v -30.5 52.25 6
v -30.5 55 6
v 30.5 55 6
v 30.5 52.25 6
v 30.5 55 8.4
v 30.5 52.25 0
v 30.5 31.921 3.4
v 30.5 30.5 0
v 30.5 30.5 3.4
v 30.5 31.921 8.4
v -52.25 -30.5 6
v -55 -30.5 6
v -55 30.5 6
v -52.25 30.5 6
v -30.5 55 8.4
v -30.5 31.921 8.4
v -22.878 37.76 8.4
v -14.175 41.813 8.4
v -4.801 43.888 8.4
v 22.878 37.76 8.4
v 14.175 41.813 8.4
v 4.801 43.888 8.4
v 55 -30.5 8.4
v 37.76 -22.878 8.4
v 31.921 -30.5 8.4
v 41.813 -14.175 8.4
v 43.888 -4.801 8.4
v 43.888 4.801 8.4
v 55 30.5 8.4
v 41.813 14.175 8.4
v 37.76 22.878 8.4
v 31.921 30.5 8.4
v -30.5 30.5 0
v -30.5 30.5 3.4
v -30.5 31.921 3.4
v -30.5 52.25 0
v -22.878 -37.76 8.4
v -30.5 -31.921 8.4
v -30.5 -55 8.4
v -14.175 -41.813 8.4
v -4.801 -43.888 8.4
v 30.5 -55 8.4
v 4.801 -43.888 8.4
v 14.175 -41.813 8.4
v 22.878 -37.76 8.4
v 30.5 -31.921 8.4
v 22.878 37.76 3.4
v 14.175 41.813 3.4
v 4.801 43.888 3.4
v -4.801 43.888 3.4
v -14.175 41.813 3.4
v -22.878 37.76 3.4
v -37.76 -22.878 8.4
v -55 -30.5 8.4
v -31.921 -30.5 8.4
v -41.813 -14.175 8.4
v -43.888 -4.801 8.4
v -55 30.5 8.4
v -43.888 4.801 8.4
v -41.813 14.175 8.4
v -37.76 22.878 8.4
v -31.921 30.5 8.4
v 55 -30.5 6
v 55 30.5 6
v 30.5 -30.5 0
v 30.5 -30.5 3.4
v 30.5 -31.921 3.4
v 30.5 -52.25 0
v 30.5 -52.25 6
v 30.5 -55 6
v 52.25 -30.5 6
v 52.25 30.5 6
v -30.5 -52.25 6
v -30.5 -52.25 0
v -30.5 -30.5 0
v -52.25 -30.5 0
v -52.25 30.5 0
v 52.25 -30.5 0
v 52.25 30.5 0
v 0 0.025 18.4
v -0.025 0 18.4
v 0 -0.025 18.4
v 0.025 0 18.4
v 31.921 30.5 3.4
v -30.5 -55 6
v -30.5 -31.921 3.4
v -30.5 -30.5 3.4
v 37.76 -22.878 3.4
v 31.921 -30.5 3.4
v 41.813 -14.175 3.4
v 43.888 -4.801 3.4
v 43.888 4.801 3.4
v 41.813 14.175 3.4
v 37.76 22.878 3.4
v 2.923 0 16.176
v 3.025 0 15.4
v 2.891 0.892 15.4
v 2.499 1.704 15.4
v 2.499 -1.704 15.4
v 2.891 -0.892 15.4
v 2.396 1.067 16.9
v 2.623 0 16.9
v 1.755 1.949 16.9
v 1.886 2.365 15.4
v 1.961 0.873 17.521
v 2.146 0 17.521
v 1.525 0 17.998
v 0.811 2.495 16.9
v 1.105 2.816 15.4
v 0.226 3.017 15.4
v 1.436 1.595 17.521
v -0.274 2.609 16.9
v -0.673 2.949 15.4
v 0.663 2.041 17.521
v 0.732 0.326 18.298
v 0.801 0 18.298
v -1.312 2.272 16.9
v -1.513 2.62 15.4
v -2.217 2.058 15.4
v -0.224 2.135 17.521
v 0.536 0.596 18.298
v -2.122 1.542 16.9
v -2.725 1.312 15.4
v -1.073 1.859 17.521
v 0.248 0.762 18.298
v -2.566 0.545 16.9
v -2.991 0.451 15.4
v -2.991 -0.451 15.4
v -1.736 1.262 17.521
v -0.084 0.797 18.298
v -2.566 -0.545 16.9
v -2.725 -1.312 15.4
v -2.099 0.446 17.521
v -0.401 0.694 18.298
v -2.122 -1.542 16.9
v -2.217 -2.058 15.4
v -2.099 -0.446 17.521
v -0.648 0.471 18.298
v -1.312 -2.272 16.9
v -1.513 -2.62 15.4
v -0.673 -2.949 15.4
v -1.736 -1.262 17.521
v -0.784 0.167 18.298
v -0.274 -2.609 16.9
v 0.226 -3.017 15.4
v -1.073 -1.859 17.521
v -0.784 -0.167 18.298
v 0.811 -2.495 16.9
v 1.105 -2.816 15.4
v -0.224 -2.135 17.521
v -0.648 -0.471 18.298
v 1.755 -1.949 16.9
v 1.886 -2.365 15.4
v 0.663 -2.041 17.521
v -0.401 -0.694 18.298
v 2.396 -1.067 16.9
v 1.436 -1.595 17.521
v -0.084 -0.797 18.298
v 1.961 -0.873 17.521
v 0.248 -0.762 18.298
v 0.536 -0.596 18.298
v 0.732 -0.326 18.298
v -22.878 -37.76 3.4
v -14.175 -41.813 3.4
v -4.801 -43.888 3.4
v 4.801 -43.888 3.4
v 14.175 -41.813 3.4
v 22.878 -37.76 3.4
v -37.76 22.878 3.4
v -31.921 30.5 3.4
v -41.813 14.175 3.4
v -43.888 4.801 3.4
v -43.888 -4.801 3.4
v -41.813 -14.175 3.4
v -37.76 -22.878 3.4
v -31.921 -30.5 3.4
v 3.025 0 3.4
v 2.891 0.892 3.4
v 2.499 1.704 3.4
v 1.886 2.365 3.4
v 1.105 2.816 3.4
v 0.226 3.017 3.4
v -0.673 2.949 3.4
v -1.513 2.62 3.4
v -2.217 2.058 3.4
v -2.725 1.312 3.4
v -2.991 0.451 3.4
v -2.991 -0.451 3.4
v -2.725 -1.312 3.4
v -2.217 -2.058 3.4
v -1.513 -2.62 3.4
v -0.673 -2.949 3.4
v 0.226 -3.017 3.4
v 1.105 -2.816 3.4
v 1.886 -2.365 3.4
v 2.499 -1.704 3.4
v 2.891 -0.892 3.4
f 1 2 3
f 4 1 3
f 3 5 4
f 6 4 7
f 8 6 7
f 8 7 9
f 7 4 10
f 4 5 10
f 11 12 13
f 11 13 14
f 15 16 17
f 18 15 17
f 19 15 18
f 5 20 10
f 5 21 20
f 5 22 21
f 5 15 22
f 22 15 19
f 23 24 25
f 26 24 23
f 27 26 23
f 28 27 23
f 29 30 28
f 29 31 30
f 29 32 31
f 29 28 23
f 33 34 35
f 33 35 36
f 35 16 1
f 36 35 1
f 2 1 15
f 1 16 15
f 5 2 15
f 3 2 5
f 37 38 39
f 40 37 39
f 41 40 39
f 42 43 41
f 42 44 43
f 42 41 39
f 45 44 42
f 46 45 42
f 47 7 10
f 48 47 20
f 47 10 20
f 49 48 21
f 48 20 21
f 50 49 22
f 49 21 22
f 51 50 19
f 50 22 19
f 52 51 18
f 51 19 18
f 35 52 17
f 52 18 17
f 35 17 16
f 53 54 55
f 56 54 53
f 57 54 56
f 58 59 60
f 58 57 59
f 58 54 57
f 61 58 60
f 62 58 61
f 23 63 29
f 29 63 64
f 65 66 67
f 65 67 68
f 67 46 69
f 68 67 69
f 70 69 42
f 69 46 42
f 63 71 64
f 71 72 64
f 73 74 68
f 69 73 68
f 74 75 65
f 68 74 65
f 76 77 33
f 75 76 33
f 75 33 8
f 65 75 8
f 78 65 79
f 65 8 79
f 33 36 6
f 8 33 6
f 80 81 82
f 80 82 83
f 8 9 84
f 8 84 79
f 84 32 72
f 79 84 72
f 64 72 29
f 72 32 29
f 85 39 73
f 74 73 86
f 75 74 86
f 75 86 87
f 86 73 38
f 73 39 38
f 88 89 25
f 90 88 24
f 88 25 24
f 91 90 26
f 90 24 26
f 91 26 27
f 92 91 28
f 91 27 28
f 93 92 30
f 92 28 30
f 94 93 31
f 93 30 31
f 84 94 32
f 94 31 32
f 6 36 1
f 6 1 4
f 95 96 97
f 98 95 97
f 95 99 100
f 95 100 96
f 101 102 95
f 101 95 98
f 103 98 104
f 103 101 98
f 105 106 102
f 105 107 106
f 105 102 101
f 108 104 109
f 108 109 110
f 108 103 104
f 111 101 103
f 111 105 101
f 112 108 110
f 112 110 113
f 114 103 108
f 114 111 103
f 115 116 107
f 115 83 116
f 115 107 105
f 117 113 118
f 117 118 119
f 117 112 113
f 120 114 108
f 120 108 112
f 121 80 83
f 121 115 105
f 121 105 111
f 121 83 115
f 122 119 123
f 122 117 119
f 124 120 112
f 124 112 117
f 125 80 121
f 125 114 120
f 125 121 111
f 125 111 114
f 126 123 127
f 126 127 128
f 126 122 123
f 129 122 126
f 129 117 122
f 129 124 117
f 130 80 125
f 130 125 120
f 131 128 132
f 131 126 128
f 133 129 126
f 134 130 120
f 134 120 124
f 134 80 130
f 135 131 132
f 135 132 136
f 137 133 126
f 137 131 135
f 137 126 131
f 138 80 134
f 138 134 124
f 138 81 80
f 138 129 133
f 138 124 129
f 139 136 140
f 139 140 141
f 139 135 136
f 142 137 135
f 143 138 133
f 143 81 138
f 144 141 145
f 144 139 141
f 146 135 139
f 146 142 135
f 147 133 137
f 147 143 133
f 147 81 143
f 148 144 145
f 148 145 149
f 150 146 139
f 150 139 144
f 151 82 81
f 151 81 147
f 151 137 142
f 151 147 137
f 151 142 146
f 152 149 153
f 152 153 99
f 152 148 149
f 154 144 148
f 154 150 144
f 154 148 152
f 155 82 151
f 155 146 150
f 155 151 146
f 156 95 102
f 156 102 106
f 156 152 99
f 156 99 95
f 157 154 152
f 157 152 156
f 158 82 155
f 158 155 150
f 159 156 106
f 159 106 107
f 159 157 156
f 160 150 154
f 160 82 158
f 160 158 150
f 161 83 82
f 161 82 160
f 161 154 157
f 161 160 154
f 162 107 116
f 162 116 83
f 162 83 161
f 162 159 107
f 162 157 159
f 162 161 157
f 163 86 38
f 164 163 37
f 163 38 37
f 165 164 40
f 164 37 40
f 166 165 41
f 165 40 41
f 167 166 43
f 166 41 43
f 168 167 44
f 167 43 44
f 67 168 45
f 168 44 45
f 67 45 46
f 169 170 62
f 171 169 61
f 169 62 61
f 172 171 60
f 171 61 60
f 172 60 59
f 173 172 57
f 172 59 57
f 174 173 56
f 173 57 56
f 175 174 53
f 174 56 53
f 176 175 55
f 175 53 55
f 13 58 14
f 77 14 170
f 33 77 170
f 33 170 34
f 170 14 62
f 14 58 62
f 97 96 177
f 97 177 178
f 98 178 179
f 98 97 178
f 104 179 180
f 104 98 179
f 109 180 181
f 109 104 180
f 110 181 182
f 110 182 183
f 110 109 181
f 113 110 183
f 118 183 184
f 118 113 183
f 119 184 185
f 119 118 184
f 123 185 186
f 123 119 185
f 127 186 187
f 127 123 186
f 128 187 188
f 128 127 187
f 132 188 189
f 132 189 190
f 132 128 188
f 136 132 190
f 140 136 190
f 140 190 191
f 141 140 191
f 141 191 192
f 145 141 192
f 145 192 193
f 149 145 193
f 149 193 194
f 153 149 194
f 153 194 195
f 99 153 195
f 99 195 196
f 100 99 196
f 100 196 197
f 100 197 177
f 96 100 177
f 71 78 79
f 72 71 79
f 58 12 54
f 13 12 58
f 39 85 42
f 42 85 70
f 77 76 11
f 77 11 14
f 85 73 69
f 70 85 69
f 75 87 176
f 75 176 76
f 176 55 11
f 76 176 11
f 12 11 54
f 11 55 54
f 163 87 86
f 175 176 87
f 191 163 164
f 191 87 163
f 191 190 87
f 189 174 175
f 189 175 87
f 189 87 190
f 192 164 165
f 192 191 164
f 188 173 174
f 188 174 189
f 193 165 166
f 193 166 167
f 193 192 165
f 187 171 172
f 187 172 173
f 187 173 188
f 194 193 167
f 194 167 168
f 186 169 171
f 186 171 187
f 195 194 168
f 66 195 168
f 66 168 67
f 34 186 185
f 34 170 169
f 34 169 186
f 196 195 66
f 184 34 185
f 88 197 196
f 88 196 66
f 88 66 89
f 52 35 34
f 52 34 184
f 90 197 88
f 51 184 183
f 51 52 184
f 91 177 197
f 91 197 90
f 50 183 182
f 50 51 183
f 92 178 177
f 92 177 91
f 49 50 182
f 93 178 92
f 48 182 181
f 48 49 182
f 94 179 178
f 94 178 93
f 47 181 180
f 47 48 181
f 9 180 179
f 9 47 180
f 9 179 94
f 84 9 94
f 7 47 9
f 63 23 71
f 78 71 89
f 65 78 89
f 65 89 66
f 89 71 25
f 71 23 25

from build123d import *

# Parameters (mm, degrees)
F0_W             = 104.5
F0_H             = 104.5
F1_DEPTH         = 6
F2_W             = 110
F2_H             = 110
F2_W_2           = 104.5
F2_H_2           = 104.5
F3_DEPTH         = 2.4
F4_R             = 3.025
F5_DEPTH         = 10
F6_R             = 44.15
F6_R_2           = 3.025
F7_DEPTH         = 5
F8_R             = 3
F10_DEPTH        = 8.401
F10_COPIES_COUNT = 4


# Not quite as in the source:
# - a pattern or mirror of a feature is missing from the dataset's text; its kind, count and spacing are read off the source's solid


with BuildPart() as f1:
    # F0 (on Top) → F1 (new body)
    with BuildSketch(Plane.XY):
        Rectangle(F0_W, F0_H)
    extrude(amount=F1_DEPTH)

    # F2 (on face) → F3 (join)
    with BuildSketch(Plane.XY.offset(6)):
        Rectangle(F2_W, F2_H)
        Rectangle(F2_W_2, F2_H_2, mode=Mode.SUBTRACT)
        Rectangle(F2_W_2, F2_H_2)
    extrude(amount=F3_DEPTH)

    # F4 (on face) → F5 (join)
    with BuildSketch(Plane.XY.offset(8.4)):
        Circle(F4_R)
    extrude(amount=F5_DEPTH)

    # F6 (on face) → F7 (cut)
    with BuildSketch(Plane.XY.offset(8.4)):
        Circle(F6_R)
        Circle(F6_R_2, mode=Mode.SUBTRACT)
    extrude(amount=-F7_DEPTH, mode=Mode.SUBTRACT)

    # F8
    f8_edges = [f1.edges().sort_by_distance(p)[0] for p in [
        (-3.025, 0, 18.4),
    ]]
    fillet(f8_edges, radius=F8_R)

    # F9 (on face) → F10 (cut, through all)
    with BuildSketch(Plane.XY.offset(8.4)):
        with BuildLine():
            Line((-30.5, 31.9213486557), (-30.5, 55))
            Line((-30.5, 55), (-55, 55))
            Line((-55, 55), (-55, 30.5))
            Line((-55, 30.5), (-31.9213486557, 30.5))
            ThreePointArc((-31.9213486557, 30.5), (-31.2187643894, 31.2187643894), (-30.5, 31.9213486557))
        make_face()
        with BuildLine():
            Line((-30.5, 30.5), (-30.5, 31.9213486557))
            ThreePointArc((-30.5, 31.9213486557), (-31.2187643894, 31.2187643894), (-31.9213486557, 30.5))
            Line((-31.9213486557, 30.5), (-30.5, 30.5))
        make_face()
    f10 = extrude(amount=-F10_DEPTH, mode=Mode.SUBTRACT)

    # F10_copies: F10 ×4 about axis
    f10_copies_axis = Axis((0, 0, 0), (0, 0, 1))
    for i in range(1, F10_COPIES_COUNT):
        add(f10.rotate(f10_copies_axis, i * 360 / F10_COPIES_COUNT), mode=Mode.SUBTRACT)


solid = f1.part
